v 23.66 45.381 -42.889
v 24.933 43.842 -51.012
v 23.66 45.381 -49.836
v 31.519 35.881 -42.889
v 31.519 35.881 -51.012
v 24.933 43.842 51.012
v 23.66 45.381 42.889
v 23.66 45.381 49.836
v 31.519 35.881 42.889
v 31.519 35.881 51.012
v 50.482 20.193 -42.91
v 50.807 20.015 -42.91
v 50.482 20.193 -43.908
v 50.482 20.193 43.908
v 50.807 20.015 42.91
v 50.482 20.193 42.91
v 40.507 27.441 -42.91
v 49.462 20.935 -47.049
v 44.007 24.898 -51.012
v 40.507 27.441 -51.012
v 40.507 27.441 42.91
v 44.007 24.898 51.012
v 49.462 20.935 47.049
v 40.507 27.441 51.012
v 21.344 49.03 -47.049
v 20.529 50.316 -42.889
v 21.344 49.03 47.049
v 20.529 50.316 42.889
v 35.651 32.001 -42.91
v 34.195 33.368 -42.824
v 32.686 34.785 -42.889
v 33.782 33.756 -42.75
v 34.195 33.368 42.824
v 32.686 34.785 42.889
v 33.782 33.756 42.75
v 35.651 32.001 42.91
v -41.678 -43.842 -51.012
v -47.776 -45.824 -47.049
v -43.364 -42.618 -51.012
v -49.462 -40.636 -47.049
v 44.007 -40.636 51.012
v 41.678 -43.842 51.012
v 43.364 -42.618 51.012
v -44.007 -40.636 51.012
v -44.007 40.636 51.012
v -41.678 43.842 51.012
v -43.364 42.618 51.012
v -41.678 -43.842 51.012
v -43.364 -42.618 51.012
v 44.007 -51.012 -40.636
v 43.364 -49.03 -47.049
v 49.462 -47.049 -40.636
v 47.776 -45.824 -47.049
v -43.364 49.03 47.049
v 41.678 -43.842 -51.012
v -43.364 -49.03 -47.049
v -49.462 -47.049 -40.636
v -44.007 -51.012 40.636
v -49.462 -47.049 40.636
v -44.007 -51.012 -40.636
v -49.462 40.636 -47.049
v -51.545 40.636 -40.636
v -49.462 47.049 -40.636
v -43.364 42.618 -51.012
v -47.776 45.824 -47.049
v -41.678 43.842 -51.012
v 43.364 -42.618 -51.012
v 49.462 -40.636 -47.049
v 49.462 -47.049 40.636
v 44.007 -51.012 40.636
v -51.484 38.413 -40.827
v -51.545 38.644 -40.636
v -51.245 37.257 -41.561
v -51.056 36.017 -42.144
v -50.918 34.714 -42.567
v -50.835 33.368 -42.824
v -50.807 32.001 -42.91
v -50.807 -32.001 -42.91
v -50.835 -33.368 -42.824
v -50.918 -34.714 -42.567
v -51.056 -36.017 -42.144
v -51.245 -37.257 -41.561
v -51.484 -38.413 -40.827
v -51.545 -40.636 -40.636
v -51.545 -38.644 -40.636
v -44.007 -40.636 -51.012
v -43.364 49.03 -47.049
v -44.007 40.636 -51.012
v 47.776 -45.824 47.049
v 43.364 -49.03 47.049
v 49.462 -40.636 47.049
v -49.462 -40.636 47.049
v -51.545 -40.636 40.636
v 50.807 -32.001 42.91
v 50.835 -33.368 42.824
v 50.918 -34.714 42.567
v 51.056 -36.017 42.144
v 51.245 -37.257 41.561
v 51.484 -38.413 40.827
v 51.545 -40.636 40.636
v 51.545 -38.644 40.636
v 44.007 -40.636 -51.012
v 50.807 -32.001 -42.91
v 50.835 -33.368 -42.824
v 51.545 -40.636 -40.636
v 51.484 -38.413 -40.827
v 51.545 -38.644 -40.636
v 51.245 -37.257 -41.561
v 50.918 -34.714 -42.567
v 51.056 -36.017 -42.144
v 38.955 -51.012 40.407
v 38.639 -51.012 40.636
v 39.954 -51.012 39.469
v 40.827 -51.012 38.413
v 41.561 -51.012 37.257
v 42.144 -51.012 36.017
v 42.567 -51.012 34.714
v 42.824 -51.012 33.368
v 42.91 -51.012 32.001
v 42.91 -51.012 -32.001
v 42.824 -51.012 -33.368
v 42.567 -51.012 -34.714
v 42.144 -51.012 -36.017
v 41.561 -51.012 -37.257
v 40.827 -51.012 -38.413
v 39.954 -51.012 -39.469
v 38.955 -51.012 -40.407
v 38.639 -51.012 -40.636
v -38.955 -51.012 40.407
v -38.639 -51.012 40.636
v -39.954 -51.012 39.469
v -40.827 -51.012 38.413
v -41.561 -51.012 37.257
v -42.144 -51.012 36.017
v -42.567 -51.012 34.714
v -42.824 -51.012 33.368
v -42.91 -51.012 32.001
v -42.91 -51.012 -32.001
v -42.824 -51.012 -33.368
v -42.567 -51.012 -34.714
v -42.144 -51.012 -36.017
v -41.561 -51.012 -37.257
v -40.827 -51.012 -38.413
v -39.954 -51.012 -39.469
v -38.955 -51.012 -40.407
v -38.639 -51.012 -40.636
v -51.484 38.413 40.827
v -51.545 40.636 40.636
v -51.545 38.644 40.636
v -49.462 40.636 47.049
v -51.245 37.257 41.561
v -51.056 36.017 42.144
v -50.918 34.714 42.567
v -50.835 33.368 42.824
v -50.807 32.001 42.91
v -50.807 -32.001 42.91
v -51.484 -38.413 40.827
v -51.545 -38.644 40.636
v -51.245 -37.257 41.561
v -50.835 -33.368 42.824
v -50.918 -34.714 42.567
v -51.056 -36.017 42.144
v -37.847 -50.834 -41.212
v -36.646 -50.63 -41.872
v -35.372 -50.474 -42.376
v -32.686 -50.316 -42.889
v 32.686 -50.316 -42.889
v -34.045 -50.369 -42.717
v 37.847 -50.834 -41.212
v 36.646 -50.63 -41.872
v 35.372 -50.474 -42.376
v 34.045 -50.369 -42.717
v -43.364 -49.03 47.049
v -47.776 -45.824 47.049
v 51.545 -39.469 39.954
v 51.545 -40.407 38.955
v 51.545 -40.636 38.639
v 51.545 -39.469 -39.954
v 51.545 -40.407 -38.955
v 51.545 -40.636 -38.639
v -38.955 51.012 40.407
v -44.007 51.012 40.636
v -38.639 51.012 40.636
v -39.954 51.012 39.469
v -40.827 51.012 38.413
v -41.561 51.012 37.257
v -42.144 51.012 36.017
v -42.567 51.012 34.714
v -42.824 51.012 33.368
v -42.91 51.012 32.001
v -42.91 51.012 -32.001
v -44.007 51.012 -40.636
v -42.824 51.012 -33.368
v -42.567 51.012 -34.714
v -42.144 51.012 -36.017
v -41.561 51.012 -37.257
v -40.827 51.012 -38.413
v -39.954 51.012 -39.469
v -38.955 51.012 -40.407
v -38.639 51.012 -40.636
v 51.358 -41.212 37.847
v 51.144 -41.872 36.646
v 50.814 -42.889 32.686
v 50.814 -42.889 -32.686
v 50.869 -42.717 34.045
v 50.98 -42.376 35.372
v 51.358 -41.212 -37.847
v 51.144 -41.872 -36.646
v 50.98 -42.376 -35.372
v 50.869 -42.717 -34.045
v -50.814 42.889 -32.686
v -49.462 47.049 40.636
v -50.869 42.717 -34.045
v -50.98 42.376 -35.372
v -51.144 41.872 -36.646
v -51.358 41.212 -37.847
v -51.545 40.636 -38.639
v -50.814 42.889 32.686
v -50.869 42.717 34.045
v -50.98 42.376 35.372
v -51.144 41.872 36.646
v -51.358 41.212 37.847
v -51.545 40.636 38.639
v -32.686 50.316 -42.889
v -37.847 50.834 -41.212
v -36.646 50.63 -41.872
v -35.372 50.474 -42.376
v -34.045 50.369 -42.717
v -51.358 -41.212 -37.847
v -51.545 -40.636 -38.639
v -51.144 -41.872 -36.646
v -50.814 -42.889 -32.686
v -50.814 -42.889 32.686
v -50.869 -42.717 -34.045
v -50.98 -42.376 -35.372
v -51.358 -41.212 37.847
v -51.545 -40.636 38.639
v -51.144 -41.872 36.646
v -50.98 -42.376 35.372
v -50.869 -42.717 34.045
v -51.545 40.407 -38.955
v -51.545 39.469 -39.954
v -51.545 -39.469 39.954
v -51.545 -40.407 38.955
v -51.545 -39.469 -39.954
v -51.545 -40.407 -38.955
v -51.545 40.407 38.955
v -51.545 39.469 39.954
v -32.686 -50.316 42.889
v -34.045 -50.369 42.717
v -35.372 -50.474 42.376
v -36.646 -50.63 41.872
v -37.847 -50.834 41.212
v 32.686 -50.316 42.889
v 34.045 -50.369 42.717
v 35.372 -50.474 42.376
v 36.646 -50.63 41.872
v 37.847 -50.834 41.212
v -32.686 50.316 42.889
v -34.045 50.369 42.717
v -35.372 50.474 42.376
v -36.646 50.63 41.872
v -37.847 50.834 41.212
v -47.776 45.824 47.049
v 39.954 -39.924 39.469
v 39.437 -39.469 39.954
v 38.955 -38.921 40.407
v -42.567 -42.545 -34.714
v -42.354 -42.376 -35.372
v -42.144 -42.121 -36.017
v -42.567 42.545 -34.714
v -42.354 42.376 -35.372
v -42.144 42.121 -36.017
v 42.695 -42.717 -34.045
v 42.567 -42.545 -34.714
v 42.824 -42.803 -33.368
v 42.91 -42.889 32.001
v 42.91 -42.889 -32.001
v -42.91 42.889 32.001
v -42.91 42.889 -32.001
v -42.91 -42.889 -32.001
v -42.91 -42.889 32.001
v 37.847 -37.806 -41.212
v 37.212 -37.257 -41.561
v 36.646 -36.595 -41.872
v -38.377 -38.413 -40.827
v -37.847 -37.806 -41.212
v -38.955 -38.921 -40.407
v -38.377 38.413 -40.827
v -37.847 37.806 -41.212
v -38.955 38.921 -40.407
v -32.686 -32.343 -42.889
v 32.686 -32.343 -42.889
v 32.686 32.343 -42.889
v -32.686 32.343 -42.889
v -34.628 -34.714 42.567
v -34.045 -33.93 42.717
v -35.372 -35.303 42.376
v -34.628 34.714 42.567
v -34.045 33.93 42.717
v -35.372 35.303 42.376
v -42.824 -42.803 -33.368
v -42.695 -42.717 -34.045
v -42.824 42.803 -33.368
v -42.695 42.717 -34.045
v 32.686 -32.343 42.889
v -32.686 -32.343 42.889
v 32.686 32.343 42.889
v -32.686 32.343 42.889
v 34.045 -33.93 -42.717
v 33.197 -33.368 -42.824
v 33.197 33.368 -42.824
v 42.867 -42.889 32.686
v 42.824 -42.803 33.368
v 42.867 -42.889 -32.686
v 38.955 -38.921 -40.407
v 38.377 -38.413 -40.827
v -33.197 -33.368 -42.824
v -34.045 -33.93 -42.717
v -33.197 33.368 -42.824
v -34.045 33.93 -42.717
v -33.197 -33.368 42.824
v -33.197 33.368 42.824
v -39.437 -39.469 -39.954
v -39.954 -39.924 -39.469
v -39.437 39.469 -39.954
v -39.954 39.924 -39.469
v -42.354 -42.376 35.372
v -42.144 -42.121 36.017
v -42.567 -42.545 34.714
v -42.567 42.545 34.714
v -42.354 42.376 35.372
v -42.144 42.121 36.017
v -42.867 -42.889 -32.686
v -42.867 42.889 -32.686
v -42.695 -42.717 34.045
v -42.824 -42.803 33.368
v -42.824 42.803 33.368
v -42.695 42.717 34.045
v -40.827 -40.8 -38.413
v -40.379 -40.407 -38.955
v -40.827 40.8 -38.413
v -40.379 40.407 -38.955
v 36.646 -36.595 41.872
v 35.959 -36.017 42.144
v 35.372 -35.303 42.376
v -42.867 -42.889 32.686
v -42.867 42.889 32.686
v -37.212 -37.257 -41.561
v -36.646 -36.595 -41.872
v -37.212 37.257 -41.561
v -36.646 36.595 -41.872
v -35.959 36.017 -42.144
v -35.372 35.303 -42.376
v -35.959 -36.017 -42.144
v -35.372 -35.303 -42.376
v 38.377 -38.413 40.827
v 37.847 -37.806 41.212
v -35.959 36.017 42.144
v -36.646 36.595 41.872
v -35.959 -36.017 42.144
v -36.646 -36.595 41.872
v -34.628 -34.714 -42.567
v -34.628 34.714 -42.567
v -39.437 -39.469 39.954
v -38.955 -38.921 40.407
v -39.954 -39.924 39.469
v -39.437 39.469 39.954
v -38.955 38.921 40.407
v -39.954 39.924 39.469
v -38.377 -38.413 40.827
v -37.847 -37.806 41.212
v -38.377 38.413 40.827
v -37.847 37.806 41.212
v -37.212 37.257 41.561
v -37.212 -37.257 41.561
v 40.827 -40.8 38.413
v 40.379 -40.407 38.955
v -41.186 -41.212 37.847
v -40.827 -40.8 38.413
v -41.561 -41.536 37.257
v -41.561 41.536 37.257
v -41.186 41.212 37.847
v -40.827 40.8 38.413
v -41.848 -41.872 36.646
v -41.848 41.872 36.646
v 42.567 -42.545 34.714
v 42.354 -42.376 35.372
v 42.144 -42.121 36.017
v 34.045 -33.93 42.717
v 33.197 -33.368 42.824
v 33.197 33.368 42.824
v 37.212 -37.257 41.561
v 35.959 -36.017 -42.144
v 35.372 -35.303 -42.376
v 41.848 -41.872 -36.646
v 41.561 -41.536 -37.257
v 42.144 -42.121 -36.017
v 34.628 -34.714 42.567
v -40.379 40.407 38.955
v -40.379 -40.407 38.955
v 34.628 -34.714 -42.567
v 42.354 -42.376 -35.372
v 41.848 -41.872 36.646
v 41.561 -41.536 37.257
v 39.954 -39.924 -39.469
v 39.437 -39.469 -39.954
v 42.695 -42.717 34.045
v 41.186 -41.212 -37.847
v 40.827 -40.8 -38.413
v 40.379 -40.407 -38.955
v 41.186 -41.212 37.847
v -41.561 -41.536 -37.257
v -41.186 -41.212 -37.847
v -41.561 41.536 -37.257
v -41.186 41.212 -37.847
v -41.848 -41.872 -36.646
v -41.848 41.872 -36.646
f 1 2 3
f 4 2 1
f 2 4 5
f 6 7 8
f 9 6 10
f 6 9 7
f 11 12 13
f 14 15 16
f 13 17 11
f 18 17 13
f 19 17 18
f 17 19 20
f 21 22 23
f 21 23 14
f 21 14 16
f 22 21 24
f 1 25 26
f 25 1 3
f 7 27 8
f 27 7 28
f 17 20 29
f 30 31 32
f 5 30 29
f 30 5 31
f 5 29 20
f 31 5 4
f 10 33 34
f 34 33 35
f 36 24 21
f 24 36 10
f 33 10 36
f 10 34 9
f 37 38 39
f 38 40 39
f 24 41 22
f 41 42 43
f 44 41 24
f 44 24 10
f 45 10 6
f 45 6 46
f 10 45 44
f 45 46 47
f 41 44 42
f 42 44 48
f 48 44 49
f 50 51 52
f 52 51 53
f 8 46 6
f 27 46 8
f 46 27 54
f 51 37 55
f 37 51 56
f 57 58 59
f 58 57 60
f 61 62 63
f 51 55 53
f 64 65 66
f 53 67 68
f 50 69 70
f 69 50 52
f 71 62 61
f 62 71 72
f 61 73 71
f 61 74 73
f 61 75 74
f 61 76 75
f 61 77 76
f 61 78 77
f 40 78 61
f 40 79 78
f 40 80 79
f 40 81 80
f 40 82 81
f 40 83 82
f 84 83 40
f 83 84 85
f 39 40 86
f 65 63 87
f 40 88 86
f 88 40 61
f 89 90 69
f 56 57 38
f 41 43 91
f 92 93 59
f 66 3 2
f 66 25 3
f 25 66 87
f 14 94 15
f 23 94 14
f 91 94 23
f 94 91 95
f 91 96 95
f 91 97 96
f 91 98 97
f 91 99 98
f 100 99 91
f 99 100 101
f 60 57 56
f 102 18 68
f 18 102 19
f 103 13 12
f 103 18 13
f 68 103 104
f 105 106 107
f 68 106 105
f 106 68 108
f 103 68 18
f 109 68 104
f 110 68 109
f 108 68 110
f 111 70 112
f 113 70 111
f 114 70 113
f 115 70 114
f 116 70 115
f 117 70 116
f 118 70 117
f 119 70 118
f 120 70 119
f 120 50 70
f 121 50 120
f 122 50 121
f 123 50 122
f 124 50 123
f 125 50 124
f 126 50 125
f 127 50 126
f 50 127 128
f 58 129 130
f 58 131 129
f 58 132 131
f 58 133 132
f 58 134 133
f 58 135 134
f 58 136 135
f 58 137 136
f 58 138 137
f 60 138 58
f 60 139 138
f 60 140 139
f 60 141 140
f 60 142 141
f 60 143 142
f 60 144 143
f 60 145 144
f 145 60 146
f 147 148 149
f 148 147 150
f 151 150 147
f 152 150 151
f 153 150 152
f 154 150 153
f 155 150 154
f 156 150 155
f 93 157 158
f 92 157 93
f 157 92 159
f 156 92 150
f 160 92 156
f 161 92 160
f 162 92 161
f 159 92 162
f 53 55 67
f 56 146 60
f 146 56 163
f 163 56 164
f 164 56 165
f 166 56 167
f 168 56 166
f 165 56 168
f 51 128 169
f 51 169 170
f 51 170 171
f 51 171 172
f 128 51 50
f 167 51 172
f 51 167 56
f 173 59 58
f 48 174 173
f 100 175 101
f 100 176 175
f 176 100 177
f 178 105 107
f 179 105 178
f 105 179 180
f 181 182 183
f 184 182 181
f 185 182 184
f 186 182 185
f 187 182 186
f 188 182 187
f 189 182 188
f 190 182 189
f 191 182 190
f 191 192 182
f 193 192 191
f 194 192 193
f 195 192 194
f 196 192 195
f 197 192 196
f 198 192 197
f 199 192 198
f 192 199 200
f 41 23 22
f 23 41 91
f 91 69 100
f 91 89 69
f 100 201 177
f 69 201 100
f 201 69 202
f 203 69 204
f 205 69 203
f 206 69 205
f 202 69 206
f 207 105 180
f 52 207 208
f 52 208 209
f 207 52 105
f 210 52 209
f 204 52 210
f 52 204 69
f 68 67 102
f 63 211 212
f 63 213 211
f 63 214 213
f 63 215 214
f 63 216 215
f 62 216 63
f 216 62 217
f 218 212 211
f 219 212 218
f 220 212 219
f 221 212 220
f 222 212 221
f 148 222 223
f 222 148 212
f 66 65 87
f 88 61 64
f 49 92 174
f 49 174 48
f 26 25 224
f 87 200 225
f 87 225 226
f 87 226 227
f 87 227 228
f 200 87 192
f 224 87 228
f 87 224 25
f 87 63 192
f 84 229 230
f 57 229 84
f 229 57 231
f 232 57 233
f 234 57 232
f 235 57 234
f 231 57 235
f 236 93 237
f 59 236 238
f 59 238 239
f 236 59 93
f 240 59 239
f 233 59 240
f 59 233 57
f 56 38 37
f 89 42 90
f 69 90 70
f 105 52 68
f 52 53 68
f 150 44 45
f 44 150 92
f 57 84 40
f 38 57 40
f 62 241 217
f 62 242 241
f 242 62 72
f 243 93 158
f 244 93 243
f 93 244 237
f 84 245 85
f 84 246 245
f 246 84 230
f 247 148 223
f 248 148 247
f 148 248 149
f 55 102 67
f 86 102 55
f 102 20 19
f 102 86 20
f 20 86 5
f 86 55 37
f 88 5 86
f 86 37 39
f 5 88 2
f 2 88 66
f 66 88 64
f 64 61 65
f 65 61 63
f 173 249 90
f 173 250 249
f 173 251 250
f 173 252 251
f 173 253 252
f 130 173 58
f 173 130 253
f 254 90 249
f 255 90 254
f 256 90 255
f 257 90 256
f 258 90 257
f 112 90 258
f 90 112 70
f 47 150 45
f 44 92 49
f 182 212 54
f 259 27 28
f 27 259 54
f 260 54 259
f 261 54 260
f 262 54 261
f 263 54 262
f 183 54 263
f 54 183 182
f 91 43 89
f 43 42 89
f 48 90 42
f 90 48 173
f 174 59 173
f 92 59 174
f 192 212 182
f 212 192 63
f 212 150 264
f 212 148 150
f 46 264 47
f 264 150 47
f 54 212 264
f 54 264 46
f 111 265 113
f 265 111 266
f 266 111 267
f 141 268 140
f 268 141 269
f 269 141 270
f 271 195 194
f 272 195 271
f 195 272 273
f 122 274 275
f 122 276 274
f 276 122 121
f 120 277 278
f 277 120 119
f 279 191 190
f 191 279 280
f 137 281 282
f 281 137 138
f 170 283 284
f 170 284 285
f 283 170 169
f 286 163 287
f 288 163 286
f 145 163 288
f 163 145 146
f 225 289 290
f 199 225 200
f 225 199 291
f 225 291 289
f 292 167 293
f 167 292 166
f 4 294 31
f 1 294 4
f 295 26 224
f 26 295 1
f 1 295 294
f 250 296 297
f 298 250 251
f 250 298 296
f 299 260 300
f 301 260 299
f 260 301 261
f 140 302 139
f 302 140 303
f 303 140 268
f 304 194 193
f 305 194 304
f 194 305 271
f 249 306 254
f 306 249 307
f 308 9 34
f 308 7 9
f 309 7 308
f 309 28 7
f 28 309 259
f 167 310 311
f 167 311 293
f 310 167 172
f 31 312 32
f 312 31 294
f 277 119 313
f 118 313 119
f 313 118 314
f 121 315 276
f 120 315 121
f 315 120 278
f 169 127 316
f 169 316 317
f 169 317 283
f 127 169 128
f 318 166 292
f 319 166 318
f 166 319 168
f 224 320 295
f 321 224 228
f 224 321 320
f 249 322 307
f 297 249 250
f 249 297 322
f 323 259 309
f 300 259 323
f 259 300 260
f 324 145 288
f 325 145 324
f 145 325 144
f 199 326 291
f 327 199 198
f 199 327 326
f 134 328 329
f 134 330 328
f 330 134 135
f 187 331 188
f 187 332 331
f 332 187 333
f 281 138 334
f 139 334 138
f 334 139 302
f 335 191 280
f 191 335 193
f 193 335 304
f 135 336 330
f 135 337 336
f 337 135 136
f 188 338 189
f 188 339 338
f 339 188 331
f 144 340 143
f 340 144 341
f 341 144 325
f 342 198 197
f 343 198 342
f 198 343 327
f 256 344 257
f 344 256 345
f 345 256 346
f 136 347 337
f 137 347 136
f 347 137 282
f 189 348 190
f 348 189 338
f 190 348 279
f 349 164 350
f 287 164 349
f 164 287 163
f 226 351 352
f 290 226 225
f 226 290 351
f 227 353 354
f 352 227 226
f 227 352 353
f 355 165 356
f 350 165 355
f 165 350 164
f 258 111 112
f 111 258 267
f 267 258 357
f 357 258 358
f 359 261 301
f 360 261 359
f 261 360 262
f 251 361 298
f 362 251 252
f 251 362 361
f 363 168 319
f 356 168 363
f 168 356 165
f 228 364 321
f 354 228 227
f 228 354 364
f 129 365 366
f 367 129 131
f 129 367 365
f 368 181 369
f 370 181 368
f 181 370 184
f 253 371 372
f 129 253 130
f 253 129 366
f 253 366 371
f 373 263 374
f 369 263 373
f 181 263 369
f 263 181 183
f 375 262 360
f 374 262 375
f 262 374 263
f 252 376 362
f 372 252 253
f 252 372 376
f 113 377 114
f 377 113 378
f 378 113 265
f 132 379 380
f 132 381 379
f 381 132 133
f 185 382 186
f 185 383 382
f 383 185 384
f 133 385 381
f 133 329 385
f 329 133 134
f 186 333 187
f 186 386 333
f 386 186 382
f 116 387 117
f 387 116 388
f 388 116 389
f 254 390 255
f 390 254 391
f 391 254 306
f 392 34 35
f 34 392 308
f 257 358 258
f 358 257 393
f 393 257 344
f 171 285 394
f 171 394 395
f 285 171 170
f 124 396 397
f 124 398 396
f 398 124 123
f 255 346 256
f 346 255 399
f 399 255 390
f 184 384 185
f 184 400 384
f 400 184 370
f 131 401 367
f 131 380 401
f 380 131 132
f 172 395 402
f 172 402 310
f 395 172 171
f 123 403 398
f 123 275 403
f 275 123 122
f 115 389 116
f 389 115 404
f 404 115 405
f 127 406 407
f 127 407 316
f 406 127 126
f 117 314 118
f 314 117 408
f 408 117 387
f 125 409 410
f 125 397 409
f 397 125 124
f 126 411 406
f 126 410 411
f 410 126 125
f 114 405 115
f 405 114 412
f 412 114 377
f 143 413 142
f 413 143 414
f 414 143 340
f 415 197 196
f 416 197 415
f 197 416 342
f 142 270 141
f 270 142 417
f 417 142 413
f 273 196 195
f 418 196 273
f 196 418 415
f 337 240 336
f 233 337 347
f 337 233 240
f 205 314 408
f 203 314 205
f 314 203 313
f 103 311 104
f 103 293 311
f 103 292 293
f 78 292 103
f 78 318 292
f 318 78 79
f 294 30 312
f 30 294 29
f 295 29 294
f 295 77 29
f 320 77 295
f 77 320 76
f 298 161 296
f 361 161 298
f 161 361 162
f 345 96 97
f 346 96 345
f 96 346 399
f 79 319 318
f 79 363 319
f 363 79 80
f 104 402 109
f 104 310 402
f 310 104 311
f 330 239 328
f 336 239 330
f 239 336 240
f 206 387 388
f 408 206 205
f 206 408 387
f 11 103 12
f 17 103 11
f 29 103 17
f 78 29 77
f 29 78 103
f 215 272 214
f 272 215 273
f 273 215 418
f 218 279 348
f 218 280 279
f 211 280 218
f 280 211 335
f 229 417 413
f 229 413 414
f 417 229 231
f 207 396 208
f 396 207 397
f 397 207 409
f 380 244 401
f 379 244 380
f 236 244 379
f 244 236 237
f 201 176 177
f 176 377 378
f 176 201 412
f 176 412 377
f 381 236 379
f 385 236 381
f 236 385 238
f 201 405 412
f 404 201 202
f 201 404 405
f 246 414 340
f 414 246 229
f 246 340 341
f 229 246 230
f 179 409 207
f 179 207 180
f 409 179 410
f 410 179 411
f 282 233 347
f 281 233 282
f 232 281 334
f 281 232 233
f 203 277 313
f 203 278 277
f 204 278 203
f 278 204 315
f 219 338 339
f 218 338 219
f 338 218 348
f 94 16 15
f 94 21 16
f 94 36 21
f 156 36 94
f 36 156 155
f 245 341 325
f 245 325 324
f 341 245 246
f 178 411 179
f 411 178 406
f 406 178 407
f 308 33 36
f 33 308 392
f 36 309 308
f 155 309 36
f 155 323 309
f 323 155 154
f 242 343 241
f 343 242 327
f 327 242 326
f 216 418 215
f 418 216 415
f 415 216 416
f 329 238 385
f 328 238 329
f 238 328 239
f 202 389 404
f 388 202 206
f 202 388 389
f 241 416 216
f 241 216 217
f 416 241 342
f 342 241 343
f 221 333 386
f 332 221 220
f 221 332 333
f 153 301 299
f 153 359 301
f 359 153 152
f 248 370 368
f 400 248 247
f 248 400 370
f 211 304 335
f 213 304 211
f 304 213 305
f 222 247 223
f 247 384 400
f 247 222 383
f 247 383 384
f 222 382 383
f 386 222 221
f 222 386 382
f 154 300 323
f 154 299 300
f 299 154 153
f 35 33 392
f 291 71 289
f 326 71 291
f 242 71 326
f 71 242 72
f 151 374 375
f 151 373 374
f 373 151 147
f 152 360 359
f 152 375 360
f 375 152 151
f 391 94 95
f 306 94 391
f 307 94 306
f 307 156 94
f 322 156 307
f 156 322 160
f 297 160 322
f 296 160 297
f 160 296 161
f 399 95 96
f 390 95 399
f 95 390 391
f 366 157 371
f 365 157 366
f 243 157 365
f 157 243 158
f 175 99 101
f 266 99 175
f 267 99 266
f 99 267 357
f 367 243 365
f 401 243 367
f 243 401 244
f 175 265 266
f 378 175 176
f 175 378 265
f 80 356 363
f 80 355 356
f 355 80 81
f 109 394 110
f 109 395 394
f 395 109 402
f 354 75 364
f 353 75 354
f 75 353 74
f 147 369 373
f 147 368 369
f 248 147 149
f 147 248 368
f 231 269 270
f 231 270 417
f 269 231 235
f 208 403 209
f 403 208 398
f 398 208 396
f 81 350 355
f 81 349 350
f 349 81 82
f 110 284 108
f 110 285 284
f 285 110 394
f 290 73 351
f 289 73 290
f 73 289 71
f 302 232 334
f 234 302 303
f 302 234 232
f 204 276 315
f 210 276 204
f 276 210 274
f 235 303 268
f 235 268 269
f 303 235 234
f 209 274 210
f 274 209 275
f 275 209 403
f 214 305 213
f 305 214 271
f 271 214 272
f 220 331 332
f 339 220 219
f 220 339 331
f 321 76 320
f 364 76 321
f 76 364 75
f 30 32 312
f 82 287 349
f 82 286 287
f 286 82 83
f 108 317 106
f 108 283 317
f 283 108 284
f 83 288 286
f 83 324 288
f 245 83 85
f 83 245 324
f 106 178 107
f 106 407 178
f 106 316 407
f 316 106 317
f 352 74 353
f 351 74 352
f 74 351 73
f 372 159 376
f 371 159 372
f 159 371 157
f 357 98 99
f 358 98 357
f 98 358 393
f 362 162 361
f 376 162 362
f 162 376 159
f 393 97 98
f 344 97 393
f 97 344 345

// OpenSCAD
// file: variables.scad
$fn=50;

scale_factor = 300/55;

CUBIE=18.9*scale_factor; //total side length of each cube piece (including rounded edges)
CORE=18*scale_factor;
SCREW_TIP=1.5*scale_factor;
SCREW_BODY=2*scale_factor;
SCREW_HEAD=3.8*scale_factor;
INNER=4.5*scale_factor;
SPRING=3.2*scale_factor;
ROUND=2*scale_factor; //radius of rounded edges
DEPTH=6*scale_factor;
RAFT=5*scale_factor;
LAYER=0.3*scale_factor;
GAP=0.25*scale_factor;

core_height = 20 * scale_factor;
core_radius = 3 * scale_factor;

WITH_SUPPORT=false;
WITH_RAFT=false;

inner_cubie=(CUBIE-2*ROUND); //length of each cube before rounded edges

tile_length = inner_cubie*0.75;
tile_height = 1 * scale_factor;

module tile(length, height) {
	translate([-length/2,-length/2,0]) {
		minkowski(){
			translate([0,0,-height/2]) cube([length,length,height]);
			cylinder(r=ROUND,h=height,center=true);
		}
	}
	
}

module cubie() {
    translate([-inner_cubie/2,-inner_cubie/2, -inner_cubie/2])
    minkowski() {
        cube([inner_cubie, inner_cubie, inner_cubie]);
        sphere(r=ROUND, $fn=10);
    }
}

module disc() {
    cylinder(CUBIE, r1=CORE, r2=CORE, $fn=50, center=true);

}

module disc2() {
    cylinder(CUBIE*10, r1=CORE, r2=CORE, $fn=50, center=true);

}

module icore() {
    disc();
    rotate([0,90,0])
        disc();
    rotate([90,0,0])
        disc();
}

module core2() {
    intersection() {
        disc2();
        rotate([0,90,0])
            disc2();
        rotate([90,0,0])
            disc2();
    }
}

module screw() {
    translate([5.2,0,0])
    rotate([0,90,0]) {
        cylinder(11.7,r1=SCREW_BODY,r2=SCREW_BODY,$fn=10,center=true);
        translate([0,0,-11.7/2-1.7/2])
            cylinder(1.7,r1=SCREW_HEAD,r2=SCREW_HEAD,$fn=10,center=true);
        translate([0,0,11.7/2+5.7/2])
            cylinder(5.7,r1=SCREW_TIP,r2=SCREW_TIP,$fn=10,center=true);
    }
}
// main file
include <variables.scad>

module edge_cube() {                    
     difference() {
        difference() {
            cubie();
            translate([CUBIE,CUBIE,0])
            icore();
        }
        union() {
            translate([0,-CUBIE/2 + tile_height,0])
            rotate(v=[1,0,0],a=90)
            tile(tile_length*1.05,tile_height+500);
            
            translate([-CUBIE/2 + tile_height,0,0])
			rotate(v=[0,1,0],a=90)
			tile(tile_length*1.05,tile_height+500);
        }
    }
}

edge_cube();
